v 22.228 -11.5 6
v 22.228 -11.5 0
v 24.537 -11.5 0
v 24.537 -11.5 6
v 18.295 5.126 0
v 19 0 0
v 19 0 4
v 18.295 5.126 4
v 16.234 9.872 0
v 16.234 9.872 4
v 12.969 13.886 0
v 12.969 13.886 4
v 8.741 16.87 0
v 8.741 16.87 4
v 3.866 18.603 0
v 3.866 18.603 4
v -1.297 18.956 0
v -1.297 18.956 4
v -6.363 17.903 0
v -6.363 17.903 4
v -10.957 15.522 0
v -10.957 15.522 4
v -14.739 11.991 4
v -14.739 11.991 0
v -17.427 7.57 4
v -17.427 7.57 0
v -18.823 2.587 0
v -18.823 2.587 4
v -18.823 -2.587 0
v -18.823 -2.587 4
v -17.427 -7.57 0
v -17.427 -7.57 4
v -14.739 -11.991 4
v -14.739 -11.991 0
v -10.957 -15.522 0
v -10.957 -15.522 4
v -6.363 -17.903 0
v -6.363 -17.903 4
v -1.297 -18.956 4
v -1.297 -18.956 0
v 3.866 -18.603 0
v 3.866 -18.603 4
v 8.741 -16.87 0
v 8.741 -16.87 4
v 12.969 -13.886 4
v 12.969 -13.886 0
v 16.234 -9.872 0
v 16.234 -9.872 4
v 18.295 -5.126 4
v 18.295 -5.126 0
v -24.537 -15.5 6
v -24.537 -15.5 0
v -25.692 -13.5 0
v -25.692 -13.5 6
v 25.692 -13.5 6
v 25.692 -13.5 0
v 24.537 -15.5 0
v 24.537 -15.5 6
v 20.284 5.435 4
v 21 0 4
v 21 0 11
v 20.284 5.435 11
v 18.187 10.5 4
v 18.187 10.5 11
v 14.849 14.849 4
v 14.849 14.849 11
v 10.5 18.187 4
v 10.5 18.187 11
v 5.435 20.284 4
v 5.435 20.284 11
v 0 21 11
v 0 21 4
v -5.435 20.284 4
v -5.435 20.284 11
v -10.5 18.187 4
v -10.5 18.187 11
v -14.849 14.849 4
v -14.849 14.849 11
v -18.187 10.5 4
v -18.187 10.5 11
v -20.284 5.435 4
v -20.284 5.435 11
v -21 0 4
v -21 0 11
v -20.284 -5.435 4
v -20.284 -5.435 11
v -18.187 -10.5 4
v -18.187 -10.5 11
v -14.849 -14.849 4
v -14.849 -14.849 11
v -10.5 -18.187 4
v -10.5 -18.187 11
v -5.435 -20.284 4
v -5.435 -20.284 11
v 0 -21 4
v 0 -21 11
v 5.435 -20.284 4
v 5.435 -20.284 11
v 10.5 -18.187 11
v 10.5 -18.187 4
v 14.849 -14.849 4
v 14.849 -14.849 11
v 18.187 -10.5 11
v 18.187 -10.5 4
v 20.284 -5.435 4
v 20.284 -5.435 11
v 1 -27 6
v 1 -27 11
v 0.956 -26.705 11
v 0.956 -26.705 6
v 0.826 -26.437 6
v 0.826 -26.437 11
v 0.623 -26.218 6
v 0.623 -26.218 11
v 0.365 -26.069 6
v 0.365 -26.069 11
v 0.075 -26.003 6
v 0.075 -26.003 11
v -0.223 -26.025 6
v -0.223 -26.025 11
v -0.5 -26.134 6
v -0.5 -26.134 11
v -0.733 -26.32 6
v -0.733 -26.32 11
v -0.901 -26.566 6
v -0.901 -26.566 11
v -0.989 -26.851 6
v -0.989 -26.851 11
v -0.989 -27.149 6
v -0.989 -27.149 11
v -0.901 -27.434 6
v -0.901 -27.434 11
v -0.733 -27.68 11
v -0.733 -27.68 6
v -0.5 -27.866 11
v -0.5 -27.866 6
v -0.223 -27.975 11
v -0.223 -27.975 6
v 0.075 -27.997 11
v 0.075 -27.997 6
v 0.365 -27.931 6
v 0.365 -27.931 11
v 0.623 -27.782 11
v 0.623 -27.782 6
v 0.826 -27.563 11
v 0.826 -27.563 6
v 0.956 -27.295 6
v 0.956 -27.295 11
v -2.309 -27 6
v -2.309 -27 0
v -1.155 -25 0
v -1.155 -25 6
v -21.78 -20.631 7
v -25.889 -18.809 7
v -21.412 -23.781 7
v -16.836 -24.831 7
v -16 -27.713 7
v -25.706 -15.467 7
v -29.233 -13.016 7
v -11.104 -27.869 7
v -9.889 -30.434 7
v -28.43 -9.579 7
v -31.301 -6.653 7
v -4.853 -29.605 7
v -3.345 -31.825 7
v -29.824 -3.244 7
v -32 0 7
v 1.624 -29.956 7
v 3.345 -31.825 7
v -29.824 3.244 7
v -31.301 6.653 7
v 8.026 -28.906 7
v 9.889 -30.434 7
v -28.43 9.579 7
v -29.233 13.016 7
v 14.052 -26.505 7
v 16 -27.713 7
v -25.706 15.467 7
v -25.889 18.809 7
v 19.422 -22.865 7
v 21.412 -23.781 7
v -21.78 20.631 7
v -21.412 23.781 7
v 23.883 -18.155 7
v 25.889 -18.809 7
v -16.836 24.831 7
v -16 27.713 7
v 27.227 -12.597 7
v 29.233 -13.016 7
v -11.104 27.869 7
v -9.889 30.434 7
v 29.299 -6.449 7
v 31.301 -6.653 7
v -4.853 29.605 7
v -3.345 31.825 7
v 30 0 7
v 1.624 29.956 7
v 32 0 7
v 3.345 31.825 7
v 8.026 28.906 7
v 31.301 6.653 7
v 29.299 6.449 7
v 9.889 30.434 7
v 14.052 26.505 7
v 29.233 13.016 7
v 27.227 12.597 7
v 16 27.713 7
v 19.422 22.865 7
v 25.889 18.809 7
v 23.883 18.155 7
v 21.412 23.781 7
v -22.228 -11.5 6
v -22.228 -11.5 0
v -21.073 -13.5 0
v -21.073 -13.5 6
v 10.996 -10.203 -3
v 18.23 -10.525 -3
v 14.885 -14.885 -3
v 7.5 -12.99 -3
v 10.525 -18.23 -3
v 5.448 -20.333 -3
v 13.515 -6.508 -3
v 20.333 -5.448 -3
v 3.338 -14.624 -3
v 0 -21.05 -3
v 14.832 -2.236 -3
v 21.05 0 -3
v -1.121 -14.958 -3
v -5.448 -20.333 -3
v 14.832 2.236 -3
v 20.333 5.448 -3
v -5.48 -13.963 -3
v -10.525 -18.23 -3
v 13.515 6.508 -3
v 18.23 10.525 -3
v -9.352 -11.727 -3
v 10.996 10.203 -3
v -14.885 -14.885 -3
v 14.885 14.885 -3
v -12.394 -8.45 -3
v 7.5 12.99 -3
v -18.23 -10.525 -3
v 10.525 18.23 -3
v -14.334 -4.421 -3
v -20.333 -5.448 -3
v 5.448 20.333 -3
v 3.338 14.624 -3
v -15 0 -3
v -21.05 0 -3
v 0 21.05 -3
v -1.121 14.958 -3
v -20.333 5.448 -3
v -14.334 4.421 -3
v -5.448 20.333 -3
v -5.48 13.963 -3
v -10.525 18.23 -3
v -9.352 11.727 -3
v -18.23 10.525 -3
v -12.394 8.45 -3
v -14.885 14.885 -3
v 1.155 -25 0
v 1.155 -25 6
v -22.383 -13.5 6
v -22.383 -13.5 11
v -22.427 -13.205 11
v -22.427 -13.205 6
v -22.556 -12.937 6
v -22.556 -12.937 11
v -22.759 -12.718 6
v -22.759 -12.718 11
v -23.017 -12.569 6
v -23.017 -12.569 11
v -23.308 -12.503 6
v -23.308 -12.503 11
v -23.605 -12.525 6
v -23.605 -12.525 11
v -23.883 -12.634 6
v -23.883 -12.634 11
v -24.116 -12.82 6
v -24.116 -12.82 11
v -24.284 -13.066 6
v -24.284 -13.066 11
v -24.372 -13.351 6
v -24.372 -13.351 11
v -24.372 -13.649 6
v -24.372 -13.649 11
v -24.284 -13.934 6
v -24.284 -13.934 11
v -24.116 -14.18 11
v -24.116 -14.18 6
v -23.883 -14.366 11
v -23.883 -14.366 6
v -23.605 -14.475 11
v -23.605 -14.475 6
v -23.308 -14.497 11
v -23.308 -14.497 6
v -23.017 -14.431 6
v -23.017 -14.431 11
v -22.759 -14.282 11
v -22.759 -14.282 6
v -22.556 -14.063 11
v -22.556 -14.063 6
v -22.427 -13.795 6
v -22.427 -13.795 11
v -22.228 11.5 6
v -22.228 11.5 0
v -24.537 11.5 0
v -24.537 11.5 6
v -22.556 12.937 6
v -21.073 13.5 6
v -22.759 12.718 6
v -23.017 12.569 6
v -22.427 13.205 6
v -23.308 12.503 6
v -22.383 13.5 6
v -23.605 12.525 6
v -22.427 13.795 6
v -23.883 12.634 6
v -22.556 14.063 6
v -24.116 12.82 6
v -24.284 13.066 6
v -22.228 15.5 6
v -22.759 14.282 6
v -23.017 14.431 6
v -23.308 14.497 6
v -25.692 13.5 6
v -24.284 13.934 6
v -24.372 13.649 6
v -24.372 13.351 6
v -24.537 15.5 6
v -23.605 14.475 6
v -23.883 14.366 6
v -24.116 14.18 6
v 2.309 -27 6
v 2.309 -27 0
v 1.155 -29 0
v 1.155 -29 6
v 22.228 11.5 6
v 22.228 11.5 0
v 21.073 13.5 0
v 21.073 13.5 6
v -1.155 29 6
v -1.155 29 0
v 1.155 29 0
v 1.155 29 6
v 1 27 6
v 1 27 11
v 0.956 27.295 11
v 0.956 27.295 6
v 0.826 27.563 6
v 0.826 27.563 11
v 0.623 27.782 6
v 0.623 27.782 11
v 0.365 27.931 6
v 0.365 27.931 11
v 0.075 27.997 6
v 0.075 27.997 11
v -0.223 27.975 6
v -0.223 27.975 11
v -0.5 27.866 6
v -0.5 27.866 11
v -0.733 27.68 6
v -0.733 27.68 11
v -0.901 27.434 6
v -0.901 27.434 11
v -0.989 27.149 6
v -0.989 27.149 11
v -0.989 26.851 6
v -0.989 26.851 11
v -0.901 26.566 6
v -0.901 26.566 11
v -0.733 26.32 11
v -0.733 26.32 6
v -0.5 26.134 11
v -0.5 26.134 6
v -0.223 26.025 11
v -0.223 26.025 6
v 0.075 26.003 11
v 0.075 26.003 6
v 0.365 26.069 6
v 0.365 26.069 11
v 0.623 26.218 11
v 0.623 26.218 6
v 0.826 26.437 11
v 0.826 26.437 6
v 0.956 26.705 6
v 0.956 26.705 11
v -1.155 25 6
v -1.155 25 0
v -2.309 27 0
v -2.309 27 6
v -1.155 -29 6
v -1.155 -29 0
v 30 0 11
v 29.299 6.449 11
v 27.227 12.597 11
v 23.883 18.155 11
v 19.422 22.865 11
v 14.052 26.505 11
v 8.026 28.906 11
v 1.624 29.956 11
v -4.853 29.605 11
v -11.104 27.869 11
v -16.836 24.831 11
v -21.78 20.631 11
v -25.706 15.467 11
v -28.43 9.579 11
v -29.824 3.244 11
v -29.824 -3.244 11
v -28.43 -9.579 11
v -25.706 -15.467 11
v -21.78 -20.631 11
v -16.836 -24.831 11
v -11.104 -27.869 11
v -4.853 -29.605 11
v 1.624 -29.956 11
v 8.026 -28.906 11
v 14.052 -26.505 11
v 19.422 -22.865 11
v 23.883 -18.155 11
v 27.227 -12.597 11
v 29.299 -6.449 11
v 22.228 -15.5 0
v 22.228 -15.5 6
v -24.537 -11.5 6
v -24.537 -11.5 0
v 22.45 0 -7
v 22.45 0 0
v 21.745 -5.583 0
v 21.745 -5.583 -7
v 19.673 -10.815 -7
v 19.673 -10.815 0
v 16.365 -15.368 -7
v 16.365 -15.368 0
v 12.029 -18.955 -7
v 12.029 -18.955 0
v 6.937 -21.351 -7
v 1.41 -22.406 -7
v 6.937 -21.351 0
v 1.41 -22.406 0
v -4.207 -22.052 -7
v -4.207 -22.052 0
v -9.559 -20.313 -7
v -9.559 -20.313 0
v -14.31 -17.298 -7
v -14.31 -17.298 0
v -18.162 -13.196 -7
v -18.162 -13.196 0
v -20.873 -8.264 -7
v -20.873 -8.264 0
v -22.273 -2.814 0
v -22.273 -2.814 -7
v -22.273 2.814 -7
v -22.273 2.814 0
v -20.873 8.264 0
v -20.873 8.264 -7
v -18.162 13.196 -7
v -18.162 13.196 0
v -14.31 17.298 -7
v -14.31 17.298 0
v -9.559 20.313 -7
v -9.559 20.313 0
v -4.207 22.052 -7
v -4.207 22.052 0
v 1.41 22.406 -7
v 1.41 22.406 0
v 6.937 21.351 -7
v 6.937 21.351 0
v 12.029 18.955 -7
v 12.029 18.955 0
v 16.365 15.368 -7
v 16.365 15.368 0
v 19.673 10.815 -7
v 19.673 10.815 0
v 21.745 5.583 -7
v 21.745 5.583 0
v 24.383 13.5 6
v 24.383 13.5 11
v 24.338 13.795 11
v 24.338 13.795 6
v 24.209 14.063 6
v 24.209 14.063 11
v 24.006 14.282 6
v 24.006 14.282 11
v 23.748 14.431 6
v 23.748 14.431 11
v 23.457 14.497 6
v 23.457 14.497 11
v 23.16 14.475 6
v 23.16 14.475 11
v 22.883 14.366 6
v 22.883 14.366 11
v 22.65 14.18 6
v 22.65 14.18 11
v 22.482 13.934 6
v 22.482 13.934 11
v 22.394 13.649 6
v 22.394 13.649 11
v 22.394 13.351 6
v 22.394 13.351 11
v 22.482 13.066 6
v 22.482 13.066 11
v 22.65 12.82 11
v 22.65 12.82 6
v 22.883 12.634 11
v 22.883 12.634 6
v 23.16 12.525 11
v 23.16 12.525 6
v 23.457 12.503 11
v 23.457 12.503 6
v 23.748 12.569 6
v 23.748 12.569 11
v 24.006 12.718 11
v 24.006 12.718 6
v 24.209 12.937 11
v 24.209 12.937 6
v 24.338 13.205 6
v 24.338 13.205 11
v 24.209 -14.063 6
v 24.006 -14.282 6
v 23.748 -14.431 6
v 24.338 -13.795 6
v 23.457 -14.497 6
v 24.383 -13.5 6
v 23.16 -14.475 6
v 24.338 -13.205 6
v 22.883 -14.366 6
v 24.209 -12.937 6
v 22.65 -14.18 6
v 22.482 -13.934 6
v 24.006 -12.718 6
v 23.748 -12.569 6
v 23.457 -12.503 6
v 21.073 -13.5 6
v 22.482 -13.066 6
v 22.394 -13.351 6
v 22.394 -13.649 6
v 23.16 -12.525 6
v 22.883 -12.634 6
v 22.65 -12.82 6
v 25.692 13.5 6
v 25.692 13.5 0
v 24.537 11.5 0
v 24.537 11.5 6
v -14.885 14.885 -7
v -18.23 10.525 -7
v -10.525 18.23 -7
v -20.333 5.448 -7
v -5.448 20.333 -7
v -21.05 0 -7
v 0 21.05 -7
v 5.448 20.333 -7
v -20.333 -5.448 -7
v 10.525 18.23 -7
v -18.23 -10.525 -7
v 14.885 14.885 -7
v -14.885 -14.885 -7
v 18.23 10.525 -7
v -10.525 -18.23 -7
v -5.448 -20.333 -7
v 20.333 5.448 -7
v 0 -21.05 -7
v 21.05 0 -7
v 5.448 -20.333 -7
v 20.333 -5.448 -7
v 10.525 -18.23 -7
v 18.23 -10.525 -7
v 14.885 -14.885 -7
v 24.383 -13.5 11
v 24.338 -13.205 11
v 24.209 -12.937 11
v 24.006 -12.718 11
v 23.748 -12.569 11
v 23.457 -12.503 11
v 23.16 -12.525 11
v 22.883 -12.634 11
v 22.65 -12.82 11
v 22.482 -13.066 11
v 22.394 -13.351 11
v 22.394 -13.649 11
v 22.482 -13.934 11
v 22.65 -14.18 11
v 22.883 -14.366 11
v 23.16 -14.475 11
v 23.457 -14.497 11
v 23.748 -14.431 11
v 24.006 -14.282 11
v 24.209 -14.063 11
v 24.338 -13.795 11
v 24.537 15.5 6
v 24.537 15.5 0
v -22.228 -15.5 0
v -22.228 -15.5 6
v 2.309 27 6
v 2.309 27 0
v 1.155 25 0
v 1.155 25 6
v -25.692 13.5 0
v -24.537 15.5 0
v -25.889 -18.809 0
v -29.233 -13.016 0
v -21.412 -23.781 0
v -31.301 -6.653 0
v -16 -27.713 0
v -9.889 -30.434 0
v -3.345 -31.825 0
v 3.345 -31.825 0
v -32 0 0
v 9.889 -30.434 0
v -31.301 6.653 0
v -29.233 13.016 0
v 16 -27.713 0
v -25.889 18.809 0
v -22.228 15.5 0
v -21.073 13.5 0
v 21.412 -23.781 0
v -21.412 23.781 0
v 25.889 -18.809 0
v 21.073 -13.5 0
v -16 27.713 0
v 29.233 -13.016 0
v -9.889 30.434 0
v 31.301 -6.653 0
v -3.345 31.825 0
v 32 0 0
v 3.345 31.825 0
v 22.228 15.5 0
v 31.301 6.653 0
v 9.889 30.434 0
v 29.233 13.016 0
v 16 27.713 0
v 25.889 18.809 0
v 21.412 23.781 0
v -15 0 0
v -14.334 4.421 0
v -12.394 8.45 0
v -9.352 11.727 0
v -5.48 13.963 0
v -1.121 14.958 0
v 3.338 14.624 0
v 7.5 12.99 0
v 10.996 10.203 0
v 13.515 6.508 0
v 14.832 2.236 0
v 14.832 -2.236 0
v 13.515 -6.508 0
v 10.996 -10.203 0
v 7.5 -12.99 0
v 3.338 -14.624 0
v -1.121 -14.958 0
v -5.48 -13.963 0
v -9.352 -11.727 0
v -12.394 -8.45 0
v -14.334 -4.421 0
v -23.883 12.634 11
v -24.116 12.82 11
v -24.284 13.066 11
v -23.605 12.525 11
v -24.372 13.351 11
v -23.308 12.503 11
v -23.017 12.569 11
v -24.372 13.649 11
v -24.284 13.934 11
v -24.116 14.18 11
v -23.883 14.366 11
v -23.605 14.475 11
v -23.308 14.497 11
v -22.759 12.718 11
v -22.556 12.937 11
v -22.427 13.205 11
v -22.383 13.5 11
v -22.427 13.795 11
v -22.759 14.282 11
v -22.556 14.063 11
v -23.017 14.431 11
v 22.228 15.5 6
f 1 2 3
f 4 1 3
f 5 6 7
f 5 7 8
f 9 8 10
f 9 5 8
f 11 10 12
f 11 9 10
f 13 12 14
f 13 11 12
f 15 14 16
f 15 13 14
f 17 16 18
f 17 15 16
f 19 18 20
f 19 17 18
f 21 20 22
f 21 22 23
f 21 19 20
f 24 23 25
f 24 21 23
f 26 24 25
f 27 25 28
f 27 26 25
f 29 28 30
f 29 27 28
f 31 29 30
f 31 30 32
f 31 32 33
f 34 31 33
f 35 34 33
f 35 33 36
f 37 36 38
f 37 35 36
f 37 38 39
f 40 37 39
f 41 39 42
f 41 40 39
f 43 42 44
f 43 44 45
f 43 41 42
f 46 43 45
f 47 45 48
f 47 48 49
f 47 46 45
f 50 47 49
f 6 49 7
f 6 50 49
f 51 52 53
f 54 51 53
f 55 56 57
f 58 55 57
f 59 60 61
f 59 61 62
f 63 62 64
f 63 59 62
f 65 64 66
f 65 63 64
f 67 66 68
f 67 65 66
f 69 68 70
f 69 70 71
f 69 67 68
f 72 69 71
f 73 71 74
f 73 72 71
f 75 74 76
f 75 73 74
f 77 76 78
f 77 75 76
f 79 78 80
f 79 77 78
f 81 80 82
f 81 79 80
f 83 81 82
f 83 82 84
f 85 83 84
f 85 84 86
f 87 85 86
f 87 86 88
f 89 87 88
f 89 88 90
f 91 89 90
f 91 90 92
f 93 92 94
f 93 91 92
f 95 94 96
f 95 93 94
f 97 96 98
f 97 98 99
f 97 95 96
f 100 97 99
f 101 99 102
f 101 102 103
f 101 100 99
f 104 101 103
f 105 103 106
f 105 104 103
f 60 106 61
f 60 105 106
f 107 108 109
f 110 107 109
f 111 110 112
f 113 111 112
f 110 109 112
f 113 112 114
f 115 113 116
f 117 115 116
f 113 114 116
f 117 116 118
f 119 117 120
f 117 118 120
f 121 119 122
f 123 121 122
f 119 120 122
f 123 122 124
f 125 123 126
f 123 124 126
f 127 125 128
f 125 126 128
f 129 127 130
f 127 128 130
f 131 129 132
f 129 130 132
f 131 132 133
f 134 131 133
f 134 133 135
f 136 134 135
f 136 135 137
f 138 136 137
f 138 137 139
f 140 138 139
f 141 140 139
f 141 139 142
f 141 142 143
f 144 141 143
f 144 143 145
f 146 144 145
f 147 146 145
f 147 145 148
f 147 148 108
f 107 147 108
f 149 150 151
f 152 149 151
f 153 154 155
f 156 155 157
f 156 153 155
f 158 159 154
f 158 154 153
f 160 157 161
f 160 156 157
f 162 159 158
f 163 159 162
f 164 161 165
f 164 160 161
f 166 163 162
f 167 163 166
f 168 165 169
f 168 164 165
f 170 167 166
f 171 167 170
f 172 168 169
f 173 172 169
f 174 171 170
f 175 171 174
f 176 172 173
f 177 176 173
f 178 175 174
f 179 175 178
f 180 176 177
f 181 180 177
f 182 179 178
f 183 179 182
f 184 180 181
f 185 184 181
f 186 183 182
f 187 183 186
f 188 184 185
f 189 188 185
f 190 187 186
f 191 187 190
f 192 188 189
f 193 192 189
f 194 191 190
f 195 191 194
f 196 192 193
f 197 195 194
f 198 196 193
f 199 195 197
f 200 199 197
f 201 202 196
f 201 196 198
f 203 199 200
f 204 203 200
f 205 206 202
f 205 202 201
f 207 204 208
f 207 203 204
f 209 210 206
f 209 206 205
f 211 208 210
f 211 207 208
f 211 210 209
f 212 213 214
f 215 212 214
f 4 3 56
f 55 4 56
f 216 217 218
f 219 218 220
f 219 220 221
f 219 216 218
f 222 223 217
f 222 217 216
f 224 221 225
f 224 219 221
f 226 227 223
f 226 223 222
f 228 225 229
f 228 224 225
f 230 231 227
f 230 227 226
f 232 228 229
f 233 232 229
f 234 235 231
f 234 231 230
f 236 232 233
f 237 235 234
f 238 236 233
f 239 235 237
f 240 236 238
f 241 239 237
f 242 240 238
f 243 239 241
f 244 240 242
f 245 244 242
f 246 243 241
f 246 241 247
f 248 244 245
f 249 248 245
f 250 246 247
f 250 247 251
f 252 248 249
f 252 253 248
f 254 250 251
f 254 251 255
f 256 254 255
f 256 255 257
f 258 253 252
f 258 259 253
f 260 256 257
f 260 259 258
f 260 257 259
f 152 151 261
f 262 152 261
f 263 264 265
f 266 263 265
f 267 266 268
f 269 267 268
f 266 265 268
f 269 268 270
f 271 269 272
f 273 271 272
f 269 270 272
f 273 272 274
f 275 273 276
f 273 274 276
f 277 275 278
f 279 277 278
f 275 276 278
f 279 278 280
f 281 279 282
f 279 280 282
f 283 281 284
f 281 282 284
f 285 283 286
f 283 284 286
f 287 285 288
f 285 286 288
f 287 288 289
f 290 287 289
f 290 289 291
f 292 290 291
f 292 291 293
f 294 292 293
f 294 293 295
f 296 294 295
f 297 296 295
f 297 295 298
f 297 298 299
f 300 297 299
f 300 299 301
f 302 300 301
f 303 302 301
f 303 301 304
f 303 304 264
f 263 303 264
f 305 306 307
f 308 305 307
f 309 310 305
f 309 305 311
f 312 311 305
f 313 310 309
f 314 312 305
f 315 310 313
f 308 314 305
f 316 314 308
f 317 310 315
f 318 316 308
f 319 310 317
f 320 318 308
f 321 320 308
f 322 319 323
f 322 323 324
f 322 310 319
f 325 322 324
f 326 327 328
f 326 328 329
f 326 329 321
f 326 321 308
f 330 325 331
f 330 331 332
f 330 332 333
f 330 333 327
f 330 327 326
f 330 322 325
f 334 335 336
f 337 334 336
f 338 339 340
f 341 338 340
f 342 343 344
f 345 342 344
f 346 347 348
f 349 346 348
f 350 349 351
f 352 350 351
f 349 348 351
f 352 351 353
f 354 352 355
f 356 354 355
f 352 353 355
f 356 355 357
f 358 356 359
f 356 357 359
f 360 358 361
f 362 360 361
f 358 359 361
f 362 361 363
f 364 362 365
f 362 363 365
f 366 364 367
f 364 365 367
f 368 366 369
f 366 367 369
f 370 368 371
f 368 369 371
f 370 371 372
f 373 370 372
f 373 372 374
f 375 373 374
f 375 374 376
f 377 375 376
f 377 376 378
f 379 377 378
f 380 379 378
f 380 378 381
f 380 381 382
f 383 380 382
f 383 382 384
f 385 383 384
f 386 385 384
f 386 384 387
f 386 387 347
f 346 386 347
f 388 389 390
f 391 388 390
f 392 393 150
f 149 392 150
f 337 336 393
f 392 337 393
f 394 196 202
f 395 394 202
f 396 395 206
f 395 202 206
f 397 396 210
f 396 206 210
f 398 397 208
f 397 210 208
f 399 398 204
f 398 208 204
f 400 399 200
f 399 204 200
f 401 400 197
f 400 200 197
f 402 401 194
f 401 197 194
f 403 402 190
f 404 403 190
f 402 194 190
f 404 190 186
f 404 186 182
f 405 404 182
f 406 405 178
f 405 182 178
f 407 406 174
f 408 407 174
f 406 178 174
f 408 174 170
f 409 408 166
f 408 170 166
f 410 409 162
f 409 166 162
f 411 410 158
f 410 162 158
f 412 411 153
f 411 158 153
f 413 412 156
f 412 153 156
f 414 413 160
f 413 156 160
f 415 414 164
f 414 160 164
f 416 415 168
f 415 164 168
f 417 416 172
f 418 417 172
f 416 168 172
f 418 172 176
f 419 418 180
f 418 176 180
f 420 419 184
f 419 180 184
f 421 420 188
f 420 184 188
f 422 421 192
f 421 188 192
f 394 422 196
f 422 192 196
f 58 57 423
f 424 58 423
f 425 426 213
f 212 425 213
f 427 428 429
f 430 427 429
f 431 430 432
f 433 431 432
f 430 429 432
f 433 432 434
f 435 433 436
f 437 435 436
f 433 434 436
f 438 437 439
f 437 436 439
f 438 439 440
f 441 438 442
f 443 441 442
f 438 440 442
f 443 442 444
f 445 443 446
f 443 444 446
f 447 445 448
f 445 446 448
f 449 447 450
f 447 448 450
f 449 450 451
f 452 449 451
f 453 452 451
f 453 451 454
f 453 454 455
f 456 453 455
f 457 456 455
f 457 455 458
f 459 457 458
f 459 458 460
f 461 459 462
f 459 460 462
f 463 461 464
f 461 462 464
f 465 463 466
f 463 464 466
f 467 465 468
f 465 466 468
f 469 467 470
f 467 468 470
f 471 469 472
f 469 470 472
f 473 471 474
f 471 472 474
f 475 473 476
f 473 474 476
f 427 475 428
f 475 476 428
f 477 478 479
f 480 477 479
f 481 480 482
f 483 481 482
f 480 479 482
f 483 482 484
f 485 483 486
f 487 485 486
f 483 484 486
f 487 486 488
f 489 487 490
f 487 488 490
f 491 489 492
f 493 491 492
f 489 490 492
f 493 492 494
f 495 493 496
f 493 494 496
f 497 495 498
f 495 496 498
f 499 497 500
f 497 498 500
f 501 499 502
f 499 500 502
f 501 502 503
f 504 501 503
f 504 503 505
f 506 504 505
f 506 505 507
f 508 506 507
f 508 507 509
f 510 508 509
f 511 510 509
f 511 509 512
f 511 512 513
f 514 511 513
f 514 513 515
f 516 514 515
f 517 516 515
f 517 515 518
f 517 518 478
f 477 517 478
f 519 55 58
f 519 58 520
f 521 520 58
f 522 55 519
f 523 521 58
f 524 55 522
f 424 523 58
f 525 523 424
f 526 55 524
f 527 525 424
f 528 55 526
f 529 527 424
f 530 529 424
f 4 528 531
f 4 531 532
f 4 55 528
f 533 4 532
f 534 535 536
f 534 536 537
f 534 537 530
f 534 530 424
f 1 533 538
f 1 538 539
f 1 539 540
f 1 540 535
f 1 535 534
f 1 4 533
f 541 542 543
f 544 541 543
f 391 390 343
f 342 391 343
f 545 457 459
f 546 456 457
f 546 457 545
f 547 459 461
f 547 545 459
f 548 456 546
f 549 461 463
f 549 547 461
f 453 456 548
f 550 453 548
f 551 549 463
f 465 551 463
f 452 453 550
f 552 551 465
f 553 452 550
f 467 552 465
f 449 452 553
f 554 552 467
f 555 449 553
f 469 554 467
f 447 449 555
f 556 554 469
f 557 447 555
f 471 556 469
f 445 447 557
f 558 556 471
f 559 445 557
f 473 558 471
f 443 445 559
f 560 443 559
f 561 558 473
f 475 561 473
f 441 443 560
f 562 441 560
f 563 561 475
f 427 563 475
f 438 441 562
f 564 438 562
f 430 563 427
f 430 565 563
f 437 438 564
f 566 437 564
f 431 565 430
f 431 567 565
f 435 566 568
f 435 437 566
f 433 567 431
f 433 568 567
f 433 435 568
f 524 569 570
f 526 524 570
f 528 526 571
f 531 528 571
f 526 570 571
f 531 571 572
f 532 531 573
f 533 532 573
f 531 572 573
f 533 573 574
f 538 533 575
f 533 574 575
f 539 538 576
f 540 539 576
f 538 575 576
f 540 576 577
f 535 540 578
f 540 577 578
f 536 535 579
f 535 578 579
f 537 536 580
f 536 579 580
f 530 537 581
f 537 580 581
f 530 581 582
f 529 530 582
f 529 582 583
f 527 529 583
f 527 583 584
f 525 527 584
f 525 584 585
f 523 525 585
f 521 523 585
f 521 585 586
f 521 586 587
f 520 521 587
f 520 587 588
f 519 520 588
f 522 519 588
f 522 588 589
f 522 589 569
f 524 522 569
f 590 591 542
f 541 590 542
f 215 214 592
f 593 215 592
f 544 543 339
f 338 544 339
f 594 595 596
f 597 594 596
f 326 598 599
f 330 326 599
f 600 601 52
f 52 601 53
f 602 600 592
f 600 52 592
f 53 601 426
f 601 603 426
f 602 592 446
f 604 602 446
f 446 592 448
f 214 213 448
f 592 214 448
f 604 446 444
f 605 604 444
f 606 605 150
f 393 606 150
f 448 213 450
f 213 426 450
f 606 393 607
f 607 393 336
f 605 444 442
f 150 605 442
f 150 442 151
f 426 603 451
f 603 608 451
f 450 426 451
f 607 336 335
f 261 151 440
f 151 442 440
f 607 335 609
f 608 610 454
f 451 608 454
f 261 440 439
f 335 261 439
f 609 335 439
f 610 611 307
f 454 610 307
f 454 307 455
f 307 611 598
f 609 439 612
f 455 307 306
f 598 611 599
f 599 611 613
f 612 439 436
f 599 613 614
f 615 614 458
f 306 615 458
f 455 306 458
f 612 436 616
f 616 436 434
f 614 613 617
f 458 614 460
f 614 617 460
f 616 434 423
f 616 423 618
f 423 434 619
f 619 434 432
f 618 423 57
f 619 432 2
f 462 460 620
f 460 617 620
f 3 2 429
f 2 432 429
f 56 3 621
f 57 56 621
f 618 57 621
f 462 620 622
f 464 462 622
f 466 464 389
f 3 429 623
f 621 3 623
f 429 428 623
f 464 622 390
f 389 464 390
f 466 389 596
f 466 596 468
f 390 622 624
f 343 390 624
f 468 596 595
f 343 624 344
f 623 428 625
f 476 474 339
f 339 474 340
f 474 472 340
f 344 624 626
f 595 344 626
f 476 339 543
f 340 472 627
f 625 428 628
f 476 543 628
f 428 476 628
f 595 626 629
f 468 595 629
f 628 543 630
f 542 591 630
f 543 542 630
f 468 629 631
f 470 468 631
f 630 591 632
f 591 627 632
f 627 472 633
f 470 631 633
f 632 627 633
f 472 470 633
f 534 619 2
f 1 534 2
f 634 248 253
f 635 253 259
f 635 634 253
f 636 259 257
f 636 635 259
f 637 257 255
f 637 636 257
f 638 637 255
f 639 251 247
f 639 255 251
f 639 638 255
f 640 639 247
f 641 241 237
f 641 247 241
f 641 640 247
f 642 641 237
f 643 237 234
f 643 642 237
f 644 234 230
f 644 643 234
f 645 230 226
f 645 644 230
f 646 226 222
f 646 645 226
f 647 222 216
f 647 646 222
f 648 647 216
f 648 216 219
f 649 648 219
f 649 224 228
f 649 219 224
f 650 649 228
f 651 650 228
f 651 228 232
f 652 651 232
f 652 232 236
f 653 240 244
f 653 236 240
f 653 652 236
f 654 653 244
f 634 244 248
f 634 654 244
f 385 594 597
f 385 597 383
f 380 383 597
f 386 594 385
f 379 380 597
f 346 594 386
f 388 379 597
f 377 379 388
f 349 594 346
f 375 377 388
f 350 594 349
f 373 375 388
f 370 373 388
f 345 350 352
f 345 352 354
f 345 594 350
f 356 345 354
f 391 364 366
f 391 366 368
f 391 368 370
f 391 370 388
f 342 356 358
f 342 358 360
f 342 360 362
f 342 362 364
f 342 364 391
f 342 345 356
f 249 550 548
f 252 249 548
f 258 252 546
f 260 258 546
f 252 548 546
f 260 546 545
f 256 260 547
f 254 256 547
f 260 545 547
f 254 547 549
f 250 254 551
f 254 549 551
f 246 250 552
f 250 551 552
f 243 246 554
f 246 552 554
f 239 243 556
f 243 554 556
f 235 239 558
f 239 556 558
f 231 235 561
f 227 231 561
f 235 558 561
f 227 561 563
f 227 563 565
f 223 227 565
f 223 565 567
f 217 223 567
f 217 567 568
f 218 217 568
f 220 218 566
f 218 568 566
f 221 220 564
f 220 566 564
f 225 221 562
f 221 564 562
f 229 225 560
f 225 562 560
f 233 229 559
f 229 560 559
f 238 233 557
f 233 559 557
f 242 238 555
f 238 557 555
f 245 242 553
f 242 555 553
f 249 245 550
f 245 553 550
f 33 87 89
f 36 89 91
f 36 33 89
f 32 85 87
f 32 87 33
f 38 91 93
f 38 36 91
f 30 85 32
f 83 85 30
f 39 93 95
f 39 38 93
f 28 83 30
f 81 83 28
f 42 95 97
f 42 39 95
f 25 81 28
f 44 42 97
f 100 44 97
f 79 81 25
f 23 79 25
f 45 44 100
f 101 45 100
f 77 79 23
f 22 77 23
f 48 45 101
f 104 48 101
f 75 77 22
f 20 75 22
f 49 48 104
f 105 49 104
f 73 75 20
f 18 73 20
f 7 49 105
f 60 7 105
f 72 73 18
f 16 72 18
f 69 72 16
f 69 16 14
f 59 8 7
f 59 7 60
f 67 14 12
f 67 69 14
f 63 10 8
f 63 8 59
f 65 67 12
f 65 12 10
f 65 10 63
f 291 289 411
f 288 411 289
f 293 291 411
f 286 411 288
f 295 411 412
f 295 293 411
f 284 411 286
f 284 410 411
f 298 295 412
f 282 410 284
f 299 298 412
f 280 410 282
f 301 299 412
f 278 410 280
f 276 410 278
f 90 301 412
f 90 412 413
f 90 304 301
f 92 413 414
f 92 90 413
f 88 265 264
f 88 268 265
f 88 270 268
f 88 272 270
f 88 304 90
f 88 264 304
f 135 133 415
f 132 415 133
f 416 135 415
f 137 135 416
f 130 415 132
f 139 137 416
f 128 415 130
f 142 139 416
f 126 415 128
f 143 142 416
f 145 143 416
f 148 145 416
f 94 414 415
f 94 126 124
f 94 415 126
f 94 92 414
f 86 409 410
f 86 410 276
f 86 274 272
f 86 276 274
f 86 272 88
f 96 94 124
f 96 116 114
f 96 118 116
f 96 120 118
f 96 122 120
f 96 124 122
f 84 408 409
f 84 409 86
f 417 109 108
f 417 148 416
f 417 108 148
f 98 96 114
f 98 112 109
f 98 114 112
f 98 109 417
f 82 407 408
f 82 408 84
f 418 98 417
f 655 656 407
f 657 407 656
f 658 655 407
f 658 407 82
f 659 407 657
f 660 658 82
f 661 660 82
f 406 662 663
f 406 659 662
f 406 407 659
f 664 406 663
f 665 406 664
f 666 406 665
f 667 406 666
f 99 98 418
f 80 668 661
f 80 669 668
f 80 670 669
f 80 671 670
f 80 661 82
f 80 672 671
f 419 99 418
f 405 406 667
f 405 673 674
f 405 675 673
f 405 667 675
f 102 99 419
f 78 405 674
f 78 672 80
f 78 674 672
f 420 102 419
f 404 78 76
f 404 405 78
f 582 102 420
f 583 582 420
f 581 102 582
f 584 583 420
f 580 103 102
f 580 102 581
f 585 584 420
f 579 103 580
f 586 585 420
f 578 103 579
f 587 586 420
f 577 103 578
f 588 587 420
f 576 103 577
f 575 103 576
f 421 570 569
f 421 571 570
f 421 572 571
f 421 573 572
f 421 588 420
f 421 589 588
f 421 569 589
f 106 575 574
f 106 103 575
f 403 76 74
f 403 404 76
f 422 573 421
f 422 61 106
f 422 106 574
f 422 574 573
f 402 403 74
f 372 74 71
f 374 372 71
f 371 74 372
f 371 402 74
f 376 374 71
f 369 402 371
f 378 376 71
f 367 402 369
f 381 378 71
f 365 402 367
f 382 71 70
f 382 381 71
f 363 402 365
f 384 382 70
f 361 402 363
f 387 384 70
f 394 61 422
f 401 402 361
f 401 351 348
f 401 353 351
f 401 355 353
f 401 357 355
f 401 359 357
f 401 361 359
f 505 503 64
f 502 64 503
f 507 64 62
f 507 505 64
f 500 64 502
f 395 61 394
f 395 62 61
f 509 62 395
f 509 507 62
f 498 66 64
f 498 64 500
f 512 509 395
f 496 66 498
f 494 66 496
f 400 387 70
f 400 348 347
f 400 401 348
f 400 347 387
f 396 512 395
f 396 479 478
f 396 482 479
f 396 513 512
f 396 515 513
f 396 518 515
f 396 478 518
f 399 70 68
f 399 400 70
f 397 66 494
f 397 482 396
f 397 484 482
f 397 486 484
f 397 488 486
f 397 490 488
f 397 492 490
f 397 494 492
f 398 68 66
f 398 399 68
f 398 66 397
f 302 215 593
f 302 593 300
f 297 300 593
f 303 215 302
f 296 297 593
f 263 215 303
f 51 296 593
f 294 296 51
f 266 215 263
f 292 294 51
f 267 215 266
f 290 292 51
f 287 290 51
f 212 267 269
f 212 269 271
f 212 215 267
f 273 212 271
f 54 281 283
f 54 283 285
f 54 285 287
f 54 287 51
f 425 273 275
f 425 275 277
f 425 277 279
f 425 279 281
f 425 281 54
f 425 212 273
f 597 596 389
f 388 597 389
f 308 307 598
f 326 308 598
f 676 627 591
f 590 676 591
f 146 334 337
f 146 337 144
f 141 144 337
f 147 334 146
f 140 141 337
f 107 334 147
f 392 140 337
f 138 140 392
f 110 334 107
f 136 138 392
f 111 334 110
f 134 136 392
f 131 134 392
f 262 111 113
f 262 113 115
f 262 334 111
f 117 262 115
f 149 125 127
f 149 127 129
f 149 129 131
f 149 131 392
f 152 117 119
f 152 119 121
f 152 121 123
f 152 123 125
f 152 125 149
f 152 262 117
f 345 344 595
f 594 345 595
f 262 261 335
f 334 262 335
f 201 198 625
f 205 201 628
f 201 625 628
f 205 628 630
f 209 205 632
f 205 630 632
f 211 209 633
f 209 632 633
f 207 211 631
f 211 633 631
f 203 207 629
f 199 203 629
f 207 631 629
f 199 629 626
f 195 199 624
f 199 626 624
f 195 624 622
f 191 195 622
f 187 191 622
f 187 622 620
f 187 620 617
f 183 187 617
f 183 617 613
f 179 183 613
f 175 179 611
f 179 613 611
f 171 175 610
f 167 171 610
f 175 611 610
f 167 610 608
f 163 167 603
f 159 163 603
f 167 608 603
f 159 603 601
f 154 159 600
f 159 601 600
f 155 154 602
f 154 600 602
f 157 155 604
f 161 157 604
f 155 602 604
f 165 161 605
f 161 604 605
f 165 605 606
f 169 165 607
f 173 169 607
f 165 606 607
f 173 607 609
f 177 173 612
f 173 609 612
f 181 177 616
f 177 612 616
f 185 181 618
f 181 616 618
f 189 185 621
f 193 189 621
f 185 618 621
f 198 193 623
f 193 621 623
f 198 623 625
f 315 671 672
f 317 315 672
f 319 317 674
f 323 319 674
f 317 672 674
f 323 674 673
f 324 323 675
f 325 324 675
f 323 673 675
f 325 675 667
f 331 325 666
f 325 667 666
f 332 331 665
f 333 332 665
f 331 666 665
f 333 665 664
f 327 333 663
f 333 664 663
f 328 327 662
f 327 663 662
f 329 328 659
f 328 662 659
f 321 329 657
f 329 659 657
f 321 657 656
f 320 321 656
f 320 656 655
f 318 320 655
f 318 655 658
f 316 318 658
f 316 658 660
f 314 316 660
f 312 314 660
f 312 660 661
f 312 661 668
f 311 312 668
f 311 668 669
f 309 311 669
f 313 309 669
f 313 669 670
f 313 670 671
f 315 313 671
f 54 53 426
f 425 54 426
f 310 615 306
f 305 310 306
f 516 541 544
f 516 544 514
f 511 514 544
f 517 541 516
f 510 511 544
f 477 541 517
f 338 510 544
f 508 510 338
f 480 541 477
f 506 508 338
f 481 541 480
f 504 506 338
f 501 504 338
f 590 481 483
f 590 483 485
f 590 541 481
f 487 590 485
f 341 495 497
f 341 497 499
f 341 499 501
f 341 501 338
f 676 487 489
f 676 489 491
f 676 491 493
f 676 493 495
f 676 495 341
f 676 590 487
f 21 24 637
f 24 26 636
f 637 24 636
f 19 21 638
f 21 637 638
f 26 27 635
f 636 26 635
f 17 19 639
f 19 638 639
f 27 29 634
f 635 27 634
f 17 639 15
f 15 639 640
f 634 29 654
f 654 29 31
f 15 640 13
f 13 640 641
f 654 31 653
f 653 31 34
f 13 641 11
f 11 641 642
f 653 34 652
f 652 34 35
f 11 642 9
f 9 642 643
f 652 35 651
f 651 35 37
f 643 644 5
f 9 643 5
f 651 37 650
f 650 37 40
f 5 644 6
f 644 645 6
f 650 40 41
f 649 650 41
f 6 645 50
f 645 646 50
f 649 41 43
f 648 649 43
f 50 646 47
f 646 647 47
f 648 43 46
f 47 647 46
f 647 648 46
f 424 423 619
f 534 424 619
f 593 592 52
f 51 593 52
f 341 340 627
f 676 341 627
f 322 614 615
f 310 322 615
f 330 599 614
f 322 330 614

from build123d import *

# Parameters (mm, degrees)
SKETCH_1_R          = 32
SKETCH_1_R_2        = 19
EXTRUDE_1_DEPTH     = 4
SKETCH_2_R          = 32
SKETCH_2_R_2        = 21
EXTRUDE_2_DEPTH     = 7
SKETCH_3_R          = 1
CUT_EXTRUDE_1_DEPTH = 47.572524089
CUT_EXTRUDE_2_DEPTH = 6
SKETCH_5_R          = 22.45
SKETCH_5_R_2        = 15
EXTRUDE_3_DEPTH     = 7
SKETCH_6_R          = 21.05
CUT_EXTRUDE_3_DEPTH = 4
CUT_EXTRUDE_START   = -4
SKETCH_7_R          = 32
SKETCH_7_R_2        = 30
CUT_EXTRUDE_4_DEPTH = 4


with BuildPart() as part:
    # 草图1 → 凸台-拉伸1 (new body)
    with BuildSketch(Plane.XY):
        Circle(SKETCH_1_R)
        Circle(SKETCH_1_R_2, mode=Mode.SUBTRACT)
    extrude(amount=EXTRUDE_1_DEPTH)

    # 草图2 → 凸台-拉伸2 (add)
    with BuildSketch(Plane.XY.offset(4)):
        Circle(SKETCH_2_R)
        Circle(SKETCH_2_R_2, mode=Mode.SUBTRACT)
    extrude(amount=EXTRUDE_2_DEPTH)

    # 草图3 → 切除-拉伸1 (cut, through all)
    with BuildSketch(Plane.XY.offset(11)):
        with Locations((0, 27)):
            Circle(SKETCH_3_R)
        with Locations((23.382685902, 13.5)):
            Circle(SKETCH_3_R)
        with Locations((23.382685902, -13.5)):
            Circle(SKETCH_3_R)
        with Locations((0, -27)):
            Circle(SKETCH_3_R)
        with Locations((-23.382685902, -13.5)):
            Circle(SKETCH_3_R)
        with Locations((-23.382685902, 13.5)):
            Circle(SKETCH_3_R)
    extrude(amount=-CUT_EXTRUDE_1_DEPTH, mode=Mode.SUBTRACT)

    # 草图4 → 切除-拉伸2 (cut)
    with BuildSketch(Plane(origin=(0, 0, 0), x_dir=(-1, 0, 0), z_dir=(0, 0, -1))):
        Polygon((21.073284825, 13.5), (22.227985364, 11.5), (24.537386441, 11.5), (25.692086979, 13.5), (24.537386441, 15.5), (22.227985364, 15.5), align=None)
        Polygon((-1.154700538, 25), (1.154700538, 25), (2.309401077, 27), (1.154700538, 29), (-1.154700538, 29), (-2.309401077, 27), align=None)
        Polygon((22.227985364, -11.5), (21.073284825, -13.5), (22.227985364, -15.5), (24.537386441, -15.5), (25.692086979, -13.5), (24.537386441, -11.5), align=None)
        Polygon((1.154700538, -25), (-1.154700538, -25), (-2.309401077, -27), (-1.154700538, -29), (1.154700538, -29), (2.309401077, -27), align=None)
        Polygon((-21.073284825, -13.5), (-22.227985364, -11.5), (-24.537386441, -11.5), (-25.692086979, -13.5), (-24.537386441, -15.5), (-22.227985364, -15.5), align=None)
        Polygon((-22.227985364, 11.5), (-21.073284825, 13.5), (-22.227985364, 15.5), (-24.537386441, 15.5), (-25.692086979, 13.5), (-24.537386441, 11.5), align=None)
    extrude(amount=-CUT_EXTRUDE_2_DEPTH, mode=Mode.SUBTRACT)

    # 草图5 → 凸台-拉伸3 (add)
    with BuildSketch(Plane(origin=(0, 0, 0), x_dir=(-1, 0, 0), z_dir=(0, 0, -1))):
        with Locations(Location((0, 0, 0), (0, 0, 180))):
            Circle(SKETCH_5_R)
        Circle(SKETCH_5_R_2, mode=Mode.SUBTRACT)
    extrude(amount=EXTRUDE_3_DEPTH)

    # 草图6 → 切除-拉伸3 (cut)
    with BuildSketch(Plane(origin=(0, 0, -7), x_dir=(-1, 0, 0), z_dir=(0, 0, -1))):
        Circle(SKETCH_6_R)
    extrude(amount=-CUT_EXTRUDE_3_DEPTH, mode=Mode.SUBTRACT)

    # 草图7 → 切除-拉伸4 (cut)
    with BuildSketch(Plane.XY.offset(11).offset(CUT_EXTRUDE_START)):
        Circle(SKETCH_7_R)
        Circle(SKETCH_7_R_2, mode=Mode.SUBTRACT)
    extrude(amount=CUT_EXTRUDE_4_DEPTH, mode=Mode.SUBTRACT)


solid = part.part
